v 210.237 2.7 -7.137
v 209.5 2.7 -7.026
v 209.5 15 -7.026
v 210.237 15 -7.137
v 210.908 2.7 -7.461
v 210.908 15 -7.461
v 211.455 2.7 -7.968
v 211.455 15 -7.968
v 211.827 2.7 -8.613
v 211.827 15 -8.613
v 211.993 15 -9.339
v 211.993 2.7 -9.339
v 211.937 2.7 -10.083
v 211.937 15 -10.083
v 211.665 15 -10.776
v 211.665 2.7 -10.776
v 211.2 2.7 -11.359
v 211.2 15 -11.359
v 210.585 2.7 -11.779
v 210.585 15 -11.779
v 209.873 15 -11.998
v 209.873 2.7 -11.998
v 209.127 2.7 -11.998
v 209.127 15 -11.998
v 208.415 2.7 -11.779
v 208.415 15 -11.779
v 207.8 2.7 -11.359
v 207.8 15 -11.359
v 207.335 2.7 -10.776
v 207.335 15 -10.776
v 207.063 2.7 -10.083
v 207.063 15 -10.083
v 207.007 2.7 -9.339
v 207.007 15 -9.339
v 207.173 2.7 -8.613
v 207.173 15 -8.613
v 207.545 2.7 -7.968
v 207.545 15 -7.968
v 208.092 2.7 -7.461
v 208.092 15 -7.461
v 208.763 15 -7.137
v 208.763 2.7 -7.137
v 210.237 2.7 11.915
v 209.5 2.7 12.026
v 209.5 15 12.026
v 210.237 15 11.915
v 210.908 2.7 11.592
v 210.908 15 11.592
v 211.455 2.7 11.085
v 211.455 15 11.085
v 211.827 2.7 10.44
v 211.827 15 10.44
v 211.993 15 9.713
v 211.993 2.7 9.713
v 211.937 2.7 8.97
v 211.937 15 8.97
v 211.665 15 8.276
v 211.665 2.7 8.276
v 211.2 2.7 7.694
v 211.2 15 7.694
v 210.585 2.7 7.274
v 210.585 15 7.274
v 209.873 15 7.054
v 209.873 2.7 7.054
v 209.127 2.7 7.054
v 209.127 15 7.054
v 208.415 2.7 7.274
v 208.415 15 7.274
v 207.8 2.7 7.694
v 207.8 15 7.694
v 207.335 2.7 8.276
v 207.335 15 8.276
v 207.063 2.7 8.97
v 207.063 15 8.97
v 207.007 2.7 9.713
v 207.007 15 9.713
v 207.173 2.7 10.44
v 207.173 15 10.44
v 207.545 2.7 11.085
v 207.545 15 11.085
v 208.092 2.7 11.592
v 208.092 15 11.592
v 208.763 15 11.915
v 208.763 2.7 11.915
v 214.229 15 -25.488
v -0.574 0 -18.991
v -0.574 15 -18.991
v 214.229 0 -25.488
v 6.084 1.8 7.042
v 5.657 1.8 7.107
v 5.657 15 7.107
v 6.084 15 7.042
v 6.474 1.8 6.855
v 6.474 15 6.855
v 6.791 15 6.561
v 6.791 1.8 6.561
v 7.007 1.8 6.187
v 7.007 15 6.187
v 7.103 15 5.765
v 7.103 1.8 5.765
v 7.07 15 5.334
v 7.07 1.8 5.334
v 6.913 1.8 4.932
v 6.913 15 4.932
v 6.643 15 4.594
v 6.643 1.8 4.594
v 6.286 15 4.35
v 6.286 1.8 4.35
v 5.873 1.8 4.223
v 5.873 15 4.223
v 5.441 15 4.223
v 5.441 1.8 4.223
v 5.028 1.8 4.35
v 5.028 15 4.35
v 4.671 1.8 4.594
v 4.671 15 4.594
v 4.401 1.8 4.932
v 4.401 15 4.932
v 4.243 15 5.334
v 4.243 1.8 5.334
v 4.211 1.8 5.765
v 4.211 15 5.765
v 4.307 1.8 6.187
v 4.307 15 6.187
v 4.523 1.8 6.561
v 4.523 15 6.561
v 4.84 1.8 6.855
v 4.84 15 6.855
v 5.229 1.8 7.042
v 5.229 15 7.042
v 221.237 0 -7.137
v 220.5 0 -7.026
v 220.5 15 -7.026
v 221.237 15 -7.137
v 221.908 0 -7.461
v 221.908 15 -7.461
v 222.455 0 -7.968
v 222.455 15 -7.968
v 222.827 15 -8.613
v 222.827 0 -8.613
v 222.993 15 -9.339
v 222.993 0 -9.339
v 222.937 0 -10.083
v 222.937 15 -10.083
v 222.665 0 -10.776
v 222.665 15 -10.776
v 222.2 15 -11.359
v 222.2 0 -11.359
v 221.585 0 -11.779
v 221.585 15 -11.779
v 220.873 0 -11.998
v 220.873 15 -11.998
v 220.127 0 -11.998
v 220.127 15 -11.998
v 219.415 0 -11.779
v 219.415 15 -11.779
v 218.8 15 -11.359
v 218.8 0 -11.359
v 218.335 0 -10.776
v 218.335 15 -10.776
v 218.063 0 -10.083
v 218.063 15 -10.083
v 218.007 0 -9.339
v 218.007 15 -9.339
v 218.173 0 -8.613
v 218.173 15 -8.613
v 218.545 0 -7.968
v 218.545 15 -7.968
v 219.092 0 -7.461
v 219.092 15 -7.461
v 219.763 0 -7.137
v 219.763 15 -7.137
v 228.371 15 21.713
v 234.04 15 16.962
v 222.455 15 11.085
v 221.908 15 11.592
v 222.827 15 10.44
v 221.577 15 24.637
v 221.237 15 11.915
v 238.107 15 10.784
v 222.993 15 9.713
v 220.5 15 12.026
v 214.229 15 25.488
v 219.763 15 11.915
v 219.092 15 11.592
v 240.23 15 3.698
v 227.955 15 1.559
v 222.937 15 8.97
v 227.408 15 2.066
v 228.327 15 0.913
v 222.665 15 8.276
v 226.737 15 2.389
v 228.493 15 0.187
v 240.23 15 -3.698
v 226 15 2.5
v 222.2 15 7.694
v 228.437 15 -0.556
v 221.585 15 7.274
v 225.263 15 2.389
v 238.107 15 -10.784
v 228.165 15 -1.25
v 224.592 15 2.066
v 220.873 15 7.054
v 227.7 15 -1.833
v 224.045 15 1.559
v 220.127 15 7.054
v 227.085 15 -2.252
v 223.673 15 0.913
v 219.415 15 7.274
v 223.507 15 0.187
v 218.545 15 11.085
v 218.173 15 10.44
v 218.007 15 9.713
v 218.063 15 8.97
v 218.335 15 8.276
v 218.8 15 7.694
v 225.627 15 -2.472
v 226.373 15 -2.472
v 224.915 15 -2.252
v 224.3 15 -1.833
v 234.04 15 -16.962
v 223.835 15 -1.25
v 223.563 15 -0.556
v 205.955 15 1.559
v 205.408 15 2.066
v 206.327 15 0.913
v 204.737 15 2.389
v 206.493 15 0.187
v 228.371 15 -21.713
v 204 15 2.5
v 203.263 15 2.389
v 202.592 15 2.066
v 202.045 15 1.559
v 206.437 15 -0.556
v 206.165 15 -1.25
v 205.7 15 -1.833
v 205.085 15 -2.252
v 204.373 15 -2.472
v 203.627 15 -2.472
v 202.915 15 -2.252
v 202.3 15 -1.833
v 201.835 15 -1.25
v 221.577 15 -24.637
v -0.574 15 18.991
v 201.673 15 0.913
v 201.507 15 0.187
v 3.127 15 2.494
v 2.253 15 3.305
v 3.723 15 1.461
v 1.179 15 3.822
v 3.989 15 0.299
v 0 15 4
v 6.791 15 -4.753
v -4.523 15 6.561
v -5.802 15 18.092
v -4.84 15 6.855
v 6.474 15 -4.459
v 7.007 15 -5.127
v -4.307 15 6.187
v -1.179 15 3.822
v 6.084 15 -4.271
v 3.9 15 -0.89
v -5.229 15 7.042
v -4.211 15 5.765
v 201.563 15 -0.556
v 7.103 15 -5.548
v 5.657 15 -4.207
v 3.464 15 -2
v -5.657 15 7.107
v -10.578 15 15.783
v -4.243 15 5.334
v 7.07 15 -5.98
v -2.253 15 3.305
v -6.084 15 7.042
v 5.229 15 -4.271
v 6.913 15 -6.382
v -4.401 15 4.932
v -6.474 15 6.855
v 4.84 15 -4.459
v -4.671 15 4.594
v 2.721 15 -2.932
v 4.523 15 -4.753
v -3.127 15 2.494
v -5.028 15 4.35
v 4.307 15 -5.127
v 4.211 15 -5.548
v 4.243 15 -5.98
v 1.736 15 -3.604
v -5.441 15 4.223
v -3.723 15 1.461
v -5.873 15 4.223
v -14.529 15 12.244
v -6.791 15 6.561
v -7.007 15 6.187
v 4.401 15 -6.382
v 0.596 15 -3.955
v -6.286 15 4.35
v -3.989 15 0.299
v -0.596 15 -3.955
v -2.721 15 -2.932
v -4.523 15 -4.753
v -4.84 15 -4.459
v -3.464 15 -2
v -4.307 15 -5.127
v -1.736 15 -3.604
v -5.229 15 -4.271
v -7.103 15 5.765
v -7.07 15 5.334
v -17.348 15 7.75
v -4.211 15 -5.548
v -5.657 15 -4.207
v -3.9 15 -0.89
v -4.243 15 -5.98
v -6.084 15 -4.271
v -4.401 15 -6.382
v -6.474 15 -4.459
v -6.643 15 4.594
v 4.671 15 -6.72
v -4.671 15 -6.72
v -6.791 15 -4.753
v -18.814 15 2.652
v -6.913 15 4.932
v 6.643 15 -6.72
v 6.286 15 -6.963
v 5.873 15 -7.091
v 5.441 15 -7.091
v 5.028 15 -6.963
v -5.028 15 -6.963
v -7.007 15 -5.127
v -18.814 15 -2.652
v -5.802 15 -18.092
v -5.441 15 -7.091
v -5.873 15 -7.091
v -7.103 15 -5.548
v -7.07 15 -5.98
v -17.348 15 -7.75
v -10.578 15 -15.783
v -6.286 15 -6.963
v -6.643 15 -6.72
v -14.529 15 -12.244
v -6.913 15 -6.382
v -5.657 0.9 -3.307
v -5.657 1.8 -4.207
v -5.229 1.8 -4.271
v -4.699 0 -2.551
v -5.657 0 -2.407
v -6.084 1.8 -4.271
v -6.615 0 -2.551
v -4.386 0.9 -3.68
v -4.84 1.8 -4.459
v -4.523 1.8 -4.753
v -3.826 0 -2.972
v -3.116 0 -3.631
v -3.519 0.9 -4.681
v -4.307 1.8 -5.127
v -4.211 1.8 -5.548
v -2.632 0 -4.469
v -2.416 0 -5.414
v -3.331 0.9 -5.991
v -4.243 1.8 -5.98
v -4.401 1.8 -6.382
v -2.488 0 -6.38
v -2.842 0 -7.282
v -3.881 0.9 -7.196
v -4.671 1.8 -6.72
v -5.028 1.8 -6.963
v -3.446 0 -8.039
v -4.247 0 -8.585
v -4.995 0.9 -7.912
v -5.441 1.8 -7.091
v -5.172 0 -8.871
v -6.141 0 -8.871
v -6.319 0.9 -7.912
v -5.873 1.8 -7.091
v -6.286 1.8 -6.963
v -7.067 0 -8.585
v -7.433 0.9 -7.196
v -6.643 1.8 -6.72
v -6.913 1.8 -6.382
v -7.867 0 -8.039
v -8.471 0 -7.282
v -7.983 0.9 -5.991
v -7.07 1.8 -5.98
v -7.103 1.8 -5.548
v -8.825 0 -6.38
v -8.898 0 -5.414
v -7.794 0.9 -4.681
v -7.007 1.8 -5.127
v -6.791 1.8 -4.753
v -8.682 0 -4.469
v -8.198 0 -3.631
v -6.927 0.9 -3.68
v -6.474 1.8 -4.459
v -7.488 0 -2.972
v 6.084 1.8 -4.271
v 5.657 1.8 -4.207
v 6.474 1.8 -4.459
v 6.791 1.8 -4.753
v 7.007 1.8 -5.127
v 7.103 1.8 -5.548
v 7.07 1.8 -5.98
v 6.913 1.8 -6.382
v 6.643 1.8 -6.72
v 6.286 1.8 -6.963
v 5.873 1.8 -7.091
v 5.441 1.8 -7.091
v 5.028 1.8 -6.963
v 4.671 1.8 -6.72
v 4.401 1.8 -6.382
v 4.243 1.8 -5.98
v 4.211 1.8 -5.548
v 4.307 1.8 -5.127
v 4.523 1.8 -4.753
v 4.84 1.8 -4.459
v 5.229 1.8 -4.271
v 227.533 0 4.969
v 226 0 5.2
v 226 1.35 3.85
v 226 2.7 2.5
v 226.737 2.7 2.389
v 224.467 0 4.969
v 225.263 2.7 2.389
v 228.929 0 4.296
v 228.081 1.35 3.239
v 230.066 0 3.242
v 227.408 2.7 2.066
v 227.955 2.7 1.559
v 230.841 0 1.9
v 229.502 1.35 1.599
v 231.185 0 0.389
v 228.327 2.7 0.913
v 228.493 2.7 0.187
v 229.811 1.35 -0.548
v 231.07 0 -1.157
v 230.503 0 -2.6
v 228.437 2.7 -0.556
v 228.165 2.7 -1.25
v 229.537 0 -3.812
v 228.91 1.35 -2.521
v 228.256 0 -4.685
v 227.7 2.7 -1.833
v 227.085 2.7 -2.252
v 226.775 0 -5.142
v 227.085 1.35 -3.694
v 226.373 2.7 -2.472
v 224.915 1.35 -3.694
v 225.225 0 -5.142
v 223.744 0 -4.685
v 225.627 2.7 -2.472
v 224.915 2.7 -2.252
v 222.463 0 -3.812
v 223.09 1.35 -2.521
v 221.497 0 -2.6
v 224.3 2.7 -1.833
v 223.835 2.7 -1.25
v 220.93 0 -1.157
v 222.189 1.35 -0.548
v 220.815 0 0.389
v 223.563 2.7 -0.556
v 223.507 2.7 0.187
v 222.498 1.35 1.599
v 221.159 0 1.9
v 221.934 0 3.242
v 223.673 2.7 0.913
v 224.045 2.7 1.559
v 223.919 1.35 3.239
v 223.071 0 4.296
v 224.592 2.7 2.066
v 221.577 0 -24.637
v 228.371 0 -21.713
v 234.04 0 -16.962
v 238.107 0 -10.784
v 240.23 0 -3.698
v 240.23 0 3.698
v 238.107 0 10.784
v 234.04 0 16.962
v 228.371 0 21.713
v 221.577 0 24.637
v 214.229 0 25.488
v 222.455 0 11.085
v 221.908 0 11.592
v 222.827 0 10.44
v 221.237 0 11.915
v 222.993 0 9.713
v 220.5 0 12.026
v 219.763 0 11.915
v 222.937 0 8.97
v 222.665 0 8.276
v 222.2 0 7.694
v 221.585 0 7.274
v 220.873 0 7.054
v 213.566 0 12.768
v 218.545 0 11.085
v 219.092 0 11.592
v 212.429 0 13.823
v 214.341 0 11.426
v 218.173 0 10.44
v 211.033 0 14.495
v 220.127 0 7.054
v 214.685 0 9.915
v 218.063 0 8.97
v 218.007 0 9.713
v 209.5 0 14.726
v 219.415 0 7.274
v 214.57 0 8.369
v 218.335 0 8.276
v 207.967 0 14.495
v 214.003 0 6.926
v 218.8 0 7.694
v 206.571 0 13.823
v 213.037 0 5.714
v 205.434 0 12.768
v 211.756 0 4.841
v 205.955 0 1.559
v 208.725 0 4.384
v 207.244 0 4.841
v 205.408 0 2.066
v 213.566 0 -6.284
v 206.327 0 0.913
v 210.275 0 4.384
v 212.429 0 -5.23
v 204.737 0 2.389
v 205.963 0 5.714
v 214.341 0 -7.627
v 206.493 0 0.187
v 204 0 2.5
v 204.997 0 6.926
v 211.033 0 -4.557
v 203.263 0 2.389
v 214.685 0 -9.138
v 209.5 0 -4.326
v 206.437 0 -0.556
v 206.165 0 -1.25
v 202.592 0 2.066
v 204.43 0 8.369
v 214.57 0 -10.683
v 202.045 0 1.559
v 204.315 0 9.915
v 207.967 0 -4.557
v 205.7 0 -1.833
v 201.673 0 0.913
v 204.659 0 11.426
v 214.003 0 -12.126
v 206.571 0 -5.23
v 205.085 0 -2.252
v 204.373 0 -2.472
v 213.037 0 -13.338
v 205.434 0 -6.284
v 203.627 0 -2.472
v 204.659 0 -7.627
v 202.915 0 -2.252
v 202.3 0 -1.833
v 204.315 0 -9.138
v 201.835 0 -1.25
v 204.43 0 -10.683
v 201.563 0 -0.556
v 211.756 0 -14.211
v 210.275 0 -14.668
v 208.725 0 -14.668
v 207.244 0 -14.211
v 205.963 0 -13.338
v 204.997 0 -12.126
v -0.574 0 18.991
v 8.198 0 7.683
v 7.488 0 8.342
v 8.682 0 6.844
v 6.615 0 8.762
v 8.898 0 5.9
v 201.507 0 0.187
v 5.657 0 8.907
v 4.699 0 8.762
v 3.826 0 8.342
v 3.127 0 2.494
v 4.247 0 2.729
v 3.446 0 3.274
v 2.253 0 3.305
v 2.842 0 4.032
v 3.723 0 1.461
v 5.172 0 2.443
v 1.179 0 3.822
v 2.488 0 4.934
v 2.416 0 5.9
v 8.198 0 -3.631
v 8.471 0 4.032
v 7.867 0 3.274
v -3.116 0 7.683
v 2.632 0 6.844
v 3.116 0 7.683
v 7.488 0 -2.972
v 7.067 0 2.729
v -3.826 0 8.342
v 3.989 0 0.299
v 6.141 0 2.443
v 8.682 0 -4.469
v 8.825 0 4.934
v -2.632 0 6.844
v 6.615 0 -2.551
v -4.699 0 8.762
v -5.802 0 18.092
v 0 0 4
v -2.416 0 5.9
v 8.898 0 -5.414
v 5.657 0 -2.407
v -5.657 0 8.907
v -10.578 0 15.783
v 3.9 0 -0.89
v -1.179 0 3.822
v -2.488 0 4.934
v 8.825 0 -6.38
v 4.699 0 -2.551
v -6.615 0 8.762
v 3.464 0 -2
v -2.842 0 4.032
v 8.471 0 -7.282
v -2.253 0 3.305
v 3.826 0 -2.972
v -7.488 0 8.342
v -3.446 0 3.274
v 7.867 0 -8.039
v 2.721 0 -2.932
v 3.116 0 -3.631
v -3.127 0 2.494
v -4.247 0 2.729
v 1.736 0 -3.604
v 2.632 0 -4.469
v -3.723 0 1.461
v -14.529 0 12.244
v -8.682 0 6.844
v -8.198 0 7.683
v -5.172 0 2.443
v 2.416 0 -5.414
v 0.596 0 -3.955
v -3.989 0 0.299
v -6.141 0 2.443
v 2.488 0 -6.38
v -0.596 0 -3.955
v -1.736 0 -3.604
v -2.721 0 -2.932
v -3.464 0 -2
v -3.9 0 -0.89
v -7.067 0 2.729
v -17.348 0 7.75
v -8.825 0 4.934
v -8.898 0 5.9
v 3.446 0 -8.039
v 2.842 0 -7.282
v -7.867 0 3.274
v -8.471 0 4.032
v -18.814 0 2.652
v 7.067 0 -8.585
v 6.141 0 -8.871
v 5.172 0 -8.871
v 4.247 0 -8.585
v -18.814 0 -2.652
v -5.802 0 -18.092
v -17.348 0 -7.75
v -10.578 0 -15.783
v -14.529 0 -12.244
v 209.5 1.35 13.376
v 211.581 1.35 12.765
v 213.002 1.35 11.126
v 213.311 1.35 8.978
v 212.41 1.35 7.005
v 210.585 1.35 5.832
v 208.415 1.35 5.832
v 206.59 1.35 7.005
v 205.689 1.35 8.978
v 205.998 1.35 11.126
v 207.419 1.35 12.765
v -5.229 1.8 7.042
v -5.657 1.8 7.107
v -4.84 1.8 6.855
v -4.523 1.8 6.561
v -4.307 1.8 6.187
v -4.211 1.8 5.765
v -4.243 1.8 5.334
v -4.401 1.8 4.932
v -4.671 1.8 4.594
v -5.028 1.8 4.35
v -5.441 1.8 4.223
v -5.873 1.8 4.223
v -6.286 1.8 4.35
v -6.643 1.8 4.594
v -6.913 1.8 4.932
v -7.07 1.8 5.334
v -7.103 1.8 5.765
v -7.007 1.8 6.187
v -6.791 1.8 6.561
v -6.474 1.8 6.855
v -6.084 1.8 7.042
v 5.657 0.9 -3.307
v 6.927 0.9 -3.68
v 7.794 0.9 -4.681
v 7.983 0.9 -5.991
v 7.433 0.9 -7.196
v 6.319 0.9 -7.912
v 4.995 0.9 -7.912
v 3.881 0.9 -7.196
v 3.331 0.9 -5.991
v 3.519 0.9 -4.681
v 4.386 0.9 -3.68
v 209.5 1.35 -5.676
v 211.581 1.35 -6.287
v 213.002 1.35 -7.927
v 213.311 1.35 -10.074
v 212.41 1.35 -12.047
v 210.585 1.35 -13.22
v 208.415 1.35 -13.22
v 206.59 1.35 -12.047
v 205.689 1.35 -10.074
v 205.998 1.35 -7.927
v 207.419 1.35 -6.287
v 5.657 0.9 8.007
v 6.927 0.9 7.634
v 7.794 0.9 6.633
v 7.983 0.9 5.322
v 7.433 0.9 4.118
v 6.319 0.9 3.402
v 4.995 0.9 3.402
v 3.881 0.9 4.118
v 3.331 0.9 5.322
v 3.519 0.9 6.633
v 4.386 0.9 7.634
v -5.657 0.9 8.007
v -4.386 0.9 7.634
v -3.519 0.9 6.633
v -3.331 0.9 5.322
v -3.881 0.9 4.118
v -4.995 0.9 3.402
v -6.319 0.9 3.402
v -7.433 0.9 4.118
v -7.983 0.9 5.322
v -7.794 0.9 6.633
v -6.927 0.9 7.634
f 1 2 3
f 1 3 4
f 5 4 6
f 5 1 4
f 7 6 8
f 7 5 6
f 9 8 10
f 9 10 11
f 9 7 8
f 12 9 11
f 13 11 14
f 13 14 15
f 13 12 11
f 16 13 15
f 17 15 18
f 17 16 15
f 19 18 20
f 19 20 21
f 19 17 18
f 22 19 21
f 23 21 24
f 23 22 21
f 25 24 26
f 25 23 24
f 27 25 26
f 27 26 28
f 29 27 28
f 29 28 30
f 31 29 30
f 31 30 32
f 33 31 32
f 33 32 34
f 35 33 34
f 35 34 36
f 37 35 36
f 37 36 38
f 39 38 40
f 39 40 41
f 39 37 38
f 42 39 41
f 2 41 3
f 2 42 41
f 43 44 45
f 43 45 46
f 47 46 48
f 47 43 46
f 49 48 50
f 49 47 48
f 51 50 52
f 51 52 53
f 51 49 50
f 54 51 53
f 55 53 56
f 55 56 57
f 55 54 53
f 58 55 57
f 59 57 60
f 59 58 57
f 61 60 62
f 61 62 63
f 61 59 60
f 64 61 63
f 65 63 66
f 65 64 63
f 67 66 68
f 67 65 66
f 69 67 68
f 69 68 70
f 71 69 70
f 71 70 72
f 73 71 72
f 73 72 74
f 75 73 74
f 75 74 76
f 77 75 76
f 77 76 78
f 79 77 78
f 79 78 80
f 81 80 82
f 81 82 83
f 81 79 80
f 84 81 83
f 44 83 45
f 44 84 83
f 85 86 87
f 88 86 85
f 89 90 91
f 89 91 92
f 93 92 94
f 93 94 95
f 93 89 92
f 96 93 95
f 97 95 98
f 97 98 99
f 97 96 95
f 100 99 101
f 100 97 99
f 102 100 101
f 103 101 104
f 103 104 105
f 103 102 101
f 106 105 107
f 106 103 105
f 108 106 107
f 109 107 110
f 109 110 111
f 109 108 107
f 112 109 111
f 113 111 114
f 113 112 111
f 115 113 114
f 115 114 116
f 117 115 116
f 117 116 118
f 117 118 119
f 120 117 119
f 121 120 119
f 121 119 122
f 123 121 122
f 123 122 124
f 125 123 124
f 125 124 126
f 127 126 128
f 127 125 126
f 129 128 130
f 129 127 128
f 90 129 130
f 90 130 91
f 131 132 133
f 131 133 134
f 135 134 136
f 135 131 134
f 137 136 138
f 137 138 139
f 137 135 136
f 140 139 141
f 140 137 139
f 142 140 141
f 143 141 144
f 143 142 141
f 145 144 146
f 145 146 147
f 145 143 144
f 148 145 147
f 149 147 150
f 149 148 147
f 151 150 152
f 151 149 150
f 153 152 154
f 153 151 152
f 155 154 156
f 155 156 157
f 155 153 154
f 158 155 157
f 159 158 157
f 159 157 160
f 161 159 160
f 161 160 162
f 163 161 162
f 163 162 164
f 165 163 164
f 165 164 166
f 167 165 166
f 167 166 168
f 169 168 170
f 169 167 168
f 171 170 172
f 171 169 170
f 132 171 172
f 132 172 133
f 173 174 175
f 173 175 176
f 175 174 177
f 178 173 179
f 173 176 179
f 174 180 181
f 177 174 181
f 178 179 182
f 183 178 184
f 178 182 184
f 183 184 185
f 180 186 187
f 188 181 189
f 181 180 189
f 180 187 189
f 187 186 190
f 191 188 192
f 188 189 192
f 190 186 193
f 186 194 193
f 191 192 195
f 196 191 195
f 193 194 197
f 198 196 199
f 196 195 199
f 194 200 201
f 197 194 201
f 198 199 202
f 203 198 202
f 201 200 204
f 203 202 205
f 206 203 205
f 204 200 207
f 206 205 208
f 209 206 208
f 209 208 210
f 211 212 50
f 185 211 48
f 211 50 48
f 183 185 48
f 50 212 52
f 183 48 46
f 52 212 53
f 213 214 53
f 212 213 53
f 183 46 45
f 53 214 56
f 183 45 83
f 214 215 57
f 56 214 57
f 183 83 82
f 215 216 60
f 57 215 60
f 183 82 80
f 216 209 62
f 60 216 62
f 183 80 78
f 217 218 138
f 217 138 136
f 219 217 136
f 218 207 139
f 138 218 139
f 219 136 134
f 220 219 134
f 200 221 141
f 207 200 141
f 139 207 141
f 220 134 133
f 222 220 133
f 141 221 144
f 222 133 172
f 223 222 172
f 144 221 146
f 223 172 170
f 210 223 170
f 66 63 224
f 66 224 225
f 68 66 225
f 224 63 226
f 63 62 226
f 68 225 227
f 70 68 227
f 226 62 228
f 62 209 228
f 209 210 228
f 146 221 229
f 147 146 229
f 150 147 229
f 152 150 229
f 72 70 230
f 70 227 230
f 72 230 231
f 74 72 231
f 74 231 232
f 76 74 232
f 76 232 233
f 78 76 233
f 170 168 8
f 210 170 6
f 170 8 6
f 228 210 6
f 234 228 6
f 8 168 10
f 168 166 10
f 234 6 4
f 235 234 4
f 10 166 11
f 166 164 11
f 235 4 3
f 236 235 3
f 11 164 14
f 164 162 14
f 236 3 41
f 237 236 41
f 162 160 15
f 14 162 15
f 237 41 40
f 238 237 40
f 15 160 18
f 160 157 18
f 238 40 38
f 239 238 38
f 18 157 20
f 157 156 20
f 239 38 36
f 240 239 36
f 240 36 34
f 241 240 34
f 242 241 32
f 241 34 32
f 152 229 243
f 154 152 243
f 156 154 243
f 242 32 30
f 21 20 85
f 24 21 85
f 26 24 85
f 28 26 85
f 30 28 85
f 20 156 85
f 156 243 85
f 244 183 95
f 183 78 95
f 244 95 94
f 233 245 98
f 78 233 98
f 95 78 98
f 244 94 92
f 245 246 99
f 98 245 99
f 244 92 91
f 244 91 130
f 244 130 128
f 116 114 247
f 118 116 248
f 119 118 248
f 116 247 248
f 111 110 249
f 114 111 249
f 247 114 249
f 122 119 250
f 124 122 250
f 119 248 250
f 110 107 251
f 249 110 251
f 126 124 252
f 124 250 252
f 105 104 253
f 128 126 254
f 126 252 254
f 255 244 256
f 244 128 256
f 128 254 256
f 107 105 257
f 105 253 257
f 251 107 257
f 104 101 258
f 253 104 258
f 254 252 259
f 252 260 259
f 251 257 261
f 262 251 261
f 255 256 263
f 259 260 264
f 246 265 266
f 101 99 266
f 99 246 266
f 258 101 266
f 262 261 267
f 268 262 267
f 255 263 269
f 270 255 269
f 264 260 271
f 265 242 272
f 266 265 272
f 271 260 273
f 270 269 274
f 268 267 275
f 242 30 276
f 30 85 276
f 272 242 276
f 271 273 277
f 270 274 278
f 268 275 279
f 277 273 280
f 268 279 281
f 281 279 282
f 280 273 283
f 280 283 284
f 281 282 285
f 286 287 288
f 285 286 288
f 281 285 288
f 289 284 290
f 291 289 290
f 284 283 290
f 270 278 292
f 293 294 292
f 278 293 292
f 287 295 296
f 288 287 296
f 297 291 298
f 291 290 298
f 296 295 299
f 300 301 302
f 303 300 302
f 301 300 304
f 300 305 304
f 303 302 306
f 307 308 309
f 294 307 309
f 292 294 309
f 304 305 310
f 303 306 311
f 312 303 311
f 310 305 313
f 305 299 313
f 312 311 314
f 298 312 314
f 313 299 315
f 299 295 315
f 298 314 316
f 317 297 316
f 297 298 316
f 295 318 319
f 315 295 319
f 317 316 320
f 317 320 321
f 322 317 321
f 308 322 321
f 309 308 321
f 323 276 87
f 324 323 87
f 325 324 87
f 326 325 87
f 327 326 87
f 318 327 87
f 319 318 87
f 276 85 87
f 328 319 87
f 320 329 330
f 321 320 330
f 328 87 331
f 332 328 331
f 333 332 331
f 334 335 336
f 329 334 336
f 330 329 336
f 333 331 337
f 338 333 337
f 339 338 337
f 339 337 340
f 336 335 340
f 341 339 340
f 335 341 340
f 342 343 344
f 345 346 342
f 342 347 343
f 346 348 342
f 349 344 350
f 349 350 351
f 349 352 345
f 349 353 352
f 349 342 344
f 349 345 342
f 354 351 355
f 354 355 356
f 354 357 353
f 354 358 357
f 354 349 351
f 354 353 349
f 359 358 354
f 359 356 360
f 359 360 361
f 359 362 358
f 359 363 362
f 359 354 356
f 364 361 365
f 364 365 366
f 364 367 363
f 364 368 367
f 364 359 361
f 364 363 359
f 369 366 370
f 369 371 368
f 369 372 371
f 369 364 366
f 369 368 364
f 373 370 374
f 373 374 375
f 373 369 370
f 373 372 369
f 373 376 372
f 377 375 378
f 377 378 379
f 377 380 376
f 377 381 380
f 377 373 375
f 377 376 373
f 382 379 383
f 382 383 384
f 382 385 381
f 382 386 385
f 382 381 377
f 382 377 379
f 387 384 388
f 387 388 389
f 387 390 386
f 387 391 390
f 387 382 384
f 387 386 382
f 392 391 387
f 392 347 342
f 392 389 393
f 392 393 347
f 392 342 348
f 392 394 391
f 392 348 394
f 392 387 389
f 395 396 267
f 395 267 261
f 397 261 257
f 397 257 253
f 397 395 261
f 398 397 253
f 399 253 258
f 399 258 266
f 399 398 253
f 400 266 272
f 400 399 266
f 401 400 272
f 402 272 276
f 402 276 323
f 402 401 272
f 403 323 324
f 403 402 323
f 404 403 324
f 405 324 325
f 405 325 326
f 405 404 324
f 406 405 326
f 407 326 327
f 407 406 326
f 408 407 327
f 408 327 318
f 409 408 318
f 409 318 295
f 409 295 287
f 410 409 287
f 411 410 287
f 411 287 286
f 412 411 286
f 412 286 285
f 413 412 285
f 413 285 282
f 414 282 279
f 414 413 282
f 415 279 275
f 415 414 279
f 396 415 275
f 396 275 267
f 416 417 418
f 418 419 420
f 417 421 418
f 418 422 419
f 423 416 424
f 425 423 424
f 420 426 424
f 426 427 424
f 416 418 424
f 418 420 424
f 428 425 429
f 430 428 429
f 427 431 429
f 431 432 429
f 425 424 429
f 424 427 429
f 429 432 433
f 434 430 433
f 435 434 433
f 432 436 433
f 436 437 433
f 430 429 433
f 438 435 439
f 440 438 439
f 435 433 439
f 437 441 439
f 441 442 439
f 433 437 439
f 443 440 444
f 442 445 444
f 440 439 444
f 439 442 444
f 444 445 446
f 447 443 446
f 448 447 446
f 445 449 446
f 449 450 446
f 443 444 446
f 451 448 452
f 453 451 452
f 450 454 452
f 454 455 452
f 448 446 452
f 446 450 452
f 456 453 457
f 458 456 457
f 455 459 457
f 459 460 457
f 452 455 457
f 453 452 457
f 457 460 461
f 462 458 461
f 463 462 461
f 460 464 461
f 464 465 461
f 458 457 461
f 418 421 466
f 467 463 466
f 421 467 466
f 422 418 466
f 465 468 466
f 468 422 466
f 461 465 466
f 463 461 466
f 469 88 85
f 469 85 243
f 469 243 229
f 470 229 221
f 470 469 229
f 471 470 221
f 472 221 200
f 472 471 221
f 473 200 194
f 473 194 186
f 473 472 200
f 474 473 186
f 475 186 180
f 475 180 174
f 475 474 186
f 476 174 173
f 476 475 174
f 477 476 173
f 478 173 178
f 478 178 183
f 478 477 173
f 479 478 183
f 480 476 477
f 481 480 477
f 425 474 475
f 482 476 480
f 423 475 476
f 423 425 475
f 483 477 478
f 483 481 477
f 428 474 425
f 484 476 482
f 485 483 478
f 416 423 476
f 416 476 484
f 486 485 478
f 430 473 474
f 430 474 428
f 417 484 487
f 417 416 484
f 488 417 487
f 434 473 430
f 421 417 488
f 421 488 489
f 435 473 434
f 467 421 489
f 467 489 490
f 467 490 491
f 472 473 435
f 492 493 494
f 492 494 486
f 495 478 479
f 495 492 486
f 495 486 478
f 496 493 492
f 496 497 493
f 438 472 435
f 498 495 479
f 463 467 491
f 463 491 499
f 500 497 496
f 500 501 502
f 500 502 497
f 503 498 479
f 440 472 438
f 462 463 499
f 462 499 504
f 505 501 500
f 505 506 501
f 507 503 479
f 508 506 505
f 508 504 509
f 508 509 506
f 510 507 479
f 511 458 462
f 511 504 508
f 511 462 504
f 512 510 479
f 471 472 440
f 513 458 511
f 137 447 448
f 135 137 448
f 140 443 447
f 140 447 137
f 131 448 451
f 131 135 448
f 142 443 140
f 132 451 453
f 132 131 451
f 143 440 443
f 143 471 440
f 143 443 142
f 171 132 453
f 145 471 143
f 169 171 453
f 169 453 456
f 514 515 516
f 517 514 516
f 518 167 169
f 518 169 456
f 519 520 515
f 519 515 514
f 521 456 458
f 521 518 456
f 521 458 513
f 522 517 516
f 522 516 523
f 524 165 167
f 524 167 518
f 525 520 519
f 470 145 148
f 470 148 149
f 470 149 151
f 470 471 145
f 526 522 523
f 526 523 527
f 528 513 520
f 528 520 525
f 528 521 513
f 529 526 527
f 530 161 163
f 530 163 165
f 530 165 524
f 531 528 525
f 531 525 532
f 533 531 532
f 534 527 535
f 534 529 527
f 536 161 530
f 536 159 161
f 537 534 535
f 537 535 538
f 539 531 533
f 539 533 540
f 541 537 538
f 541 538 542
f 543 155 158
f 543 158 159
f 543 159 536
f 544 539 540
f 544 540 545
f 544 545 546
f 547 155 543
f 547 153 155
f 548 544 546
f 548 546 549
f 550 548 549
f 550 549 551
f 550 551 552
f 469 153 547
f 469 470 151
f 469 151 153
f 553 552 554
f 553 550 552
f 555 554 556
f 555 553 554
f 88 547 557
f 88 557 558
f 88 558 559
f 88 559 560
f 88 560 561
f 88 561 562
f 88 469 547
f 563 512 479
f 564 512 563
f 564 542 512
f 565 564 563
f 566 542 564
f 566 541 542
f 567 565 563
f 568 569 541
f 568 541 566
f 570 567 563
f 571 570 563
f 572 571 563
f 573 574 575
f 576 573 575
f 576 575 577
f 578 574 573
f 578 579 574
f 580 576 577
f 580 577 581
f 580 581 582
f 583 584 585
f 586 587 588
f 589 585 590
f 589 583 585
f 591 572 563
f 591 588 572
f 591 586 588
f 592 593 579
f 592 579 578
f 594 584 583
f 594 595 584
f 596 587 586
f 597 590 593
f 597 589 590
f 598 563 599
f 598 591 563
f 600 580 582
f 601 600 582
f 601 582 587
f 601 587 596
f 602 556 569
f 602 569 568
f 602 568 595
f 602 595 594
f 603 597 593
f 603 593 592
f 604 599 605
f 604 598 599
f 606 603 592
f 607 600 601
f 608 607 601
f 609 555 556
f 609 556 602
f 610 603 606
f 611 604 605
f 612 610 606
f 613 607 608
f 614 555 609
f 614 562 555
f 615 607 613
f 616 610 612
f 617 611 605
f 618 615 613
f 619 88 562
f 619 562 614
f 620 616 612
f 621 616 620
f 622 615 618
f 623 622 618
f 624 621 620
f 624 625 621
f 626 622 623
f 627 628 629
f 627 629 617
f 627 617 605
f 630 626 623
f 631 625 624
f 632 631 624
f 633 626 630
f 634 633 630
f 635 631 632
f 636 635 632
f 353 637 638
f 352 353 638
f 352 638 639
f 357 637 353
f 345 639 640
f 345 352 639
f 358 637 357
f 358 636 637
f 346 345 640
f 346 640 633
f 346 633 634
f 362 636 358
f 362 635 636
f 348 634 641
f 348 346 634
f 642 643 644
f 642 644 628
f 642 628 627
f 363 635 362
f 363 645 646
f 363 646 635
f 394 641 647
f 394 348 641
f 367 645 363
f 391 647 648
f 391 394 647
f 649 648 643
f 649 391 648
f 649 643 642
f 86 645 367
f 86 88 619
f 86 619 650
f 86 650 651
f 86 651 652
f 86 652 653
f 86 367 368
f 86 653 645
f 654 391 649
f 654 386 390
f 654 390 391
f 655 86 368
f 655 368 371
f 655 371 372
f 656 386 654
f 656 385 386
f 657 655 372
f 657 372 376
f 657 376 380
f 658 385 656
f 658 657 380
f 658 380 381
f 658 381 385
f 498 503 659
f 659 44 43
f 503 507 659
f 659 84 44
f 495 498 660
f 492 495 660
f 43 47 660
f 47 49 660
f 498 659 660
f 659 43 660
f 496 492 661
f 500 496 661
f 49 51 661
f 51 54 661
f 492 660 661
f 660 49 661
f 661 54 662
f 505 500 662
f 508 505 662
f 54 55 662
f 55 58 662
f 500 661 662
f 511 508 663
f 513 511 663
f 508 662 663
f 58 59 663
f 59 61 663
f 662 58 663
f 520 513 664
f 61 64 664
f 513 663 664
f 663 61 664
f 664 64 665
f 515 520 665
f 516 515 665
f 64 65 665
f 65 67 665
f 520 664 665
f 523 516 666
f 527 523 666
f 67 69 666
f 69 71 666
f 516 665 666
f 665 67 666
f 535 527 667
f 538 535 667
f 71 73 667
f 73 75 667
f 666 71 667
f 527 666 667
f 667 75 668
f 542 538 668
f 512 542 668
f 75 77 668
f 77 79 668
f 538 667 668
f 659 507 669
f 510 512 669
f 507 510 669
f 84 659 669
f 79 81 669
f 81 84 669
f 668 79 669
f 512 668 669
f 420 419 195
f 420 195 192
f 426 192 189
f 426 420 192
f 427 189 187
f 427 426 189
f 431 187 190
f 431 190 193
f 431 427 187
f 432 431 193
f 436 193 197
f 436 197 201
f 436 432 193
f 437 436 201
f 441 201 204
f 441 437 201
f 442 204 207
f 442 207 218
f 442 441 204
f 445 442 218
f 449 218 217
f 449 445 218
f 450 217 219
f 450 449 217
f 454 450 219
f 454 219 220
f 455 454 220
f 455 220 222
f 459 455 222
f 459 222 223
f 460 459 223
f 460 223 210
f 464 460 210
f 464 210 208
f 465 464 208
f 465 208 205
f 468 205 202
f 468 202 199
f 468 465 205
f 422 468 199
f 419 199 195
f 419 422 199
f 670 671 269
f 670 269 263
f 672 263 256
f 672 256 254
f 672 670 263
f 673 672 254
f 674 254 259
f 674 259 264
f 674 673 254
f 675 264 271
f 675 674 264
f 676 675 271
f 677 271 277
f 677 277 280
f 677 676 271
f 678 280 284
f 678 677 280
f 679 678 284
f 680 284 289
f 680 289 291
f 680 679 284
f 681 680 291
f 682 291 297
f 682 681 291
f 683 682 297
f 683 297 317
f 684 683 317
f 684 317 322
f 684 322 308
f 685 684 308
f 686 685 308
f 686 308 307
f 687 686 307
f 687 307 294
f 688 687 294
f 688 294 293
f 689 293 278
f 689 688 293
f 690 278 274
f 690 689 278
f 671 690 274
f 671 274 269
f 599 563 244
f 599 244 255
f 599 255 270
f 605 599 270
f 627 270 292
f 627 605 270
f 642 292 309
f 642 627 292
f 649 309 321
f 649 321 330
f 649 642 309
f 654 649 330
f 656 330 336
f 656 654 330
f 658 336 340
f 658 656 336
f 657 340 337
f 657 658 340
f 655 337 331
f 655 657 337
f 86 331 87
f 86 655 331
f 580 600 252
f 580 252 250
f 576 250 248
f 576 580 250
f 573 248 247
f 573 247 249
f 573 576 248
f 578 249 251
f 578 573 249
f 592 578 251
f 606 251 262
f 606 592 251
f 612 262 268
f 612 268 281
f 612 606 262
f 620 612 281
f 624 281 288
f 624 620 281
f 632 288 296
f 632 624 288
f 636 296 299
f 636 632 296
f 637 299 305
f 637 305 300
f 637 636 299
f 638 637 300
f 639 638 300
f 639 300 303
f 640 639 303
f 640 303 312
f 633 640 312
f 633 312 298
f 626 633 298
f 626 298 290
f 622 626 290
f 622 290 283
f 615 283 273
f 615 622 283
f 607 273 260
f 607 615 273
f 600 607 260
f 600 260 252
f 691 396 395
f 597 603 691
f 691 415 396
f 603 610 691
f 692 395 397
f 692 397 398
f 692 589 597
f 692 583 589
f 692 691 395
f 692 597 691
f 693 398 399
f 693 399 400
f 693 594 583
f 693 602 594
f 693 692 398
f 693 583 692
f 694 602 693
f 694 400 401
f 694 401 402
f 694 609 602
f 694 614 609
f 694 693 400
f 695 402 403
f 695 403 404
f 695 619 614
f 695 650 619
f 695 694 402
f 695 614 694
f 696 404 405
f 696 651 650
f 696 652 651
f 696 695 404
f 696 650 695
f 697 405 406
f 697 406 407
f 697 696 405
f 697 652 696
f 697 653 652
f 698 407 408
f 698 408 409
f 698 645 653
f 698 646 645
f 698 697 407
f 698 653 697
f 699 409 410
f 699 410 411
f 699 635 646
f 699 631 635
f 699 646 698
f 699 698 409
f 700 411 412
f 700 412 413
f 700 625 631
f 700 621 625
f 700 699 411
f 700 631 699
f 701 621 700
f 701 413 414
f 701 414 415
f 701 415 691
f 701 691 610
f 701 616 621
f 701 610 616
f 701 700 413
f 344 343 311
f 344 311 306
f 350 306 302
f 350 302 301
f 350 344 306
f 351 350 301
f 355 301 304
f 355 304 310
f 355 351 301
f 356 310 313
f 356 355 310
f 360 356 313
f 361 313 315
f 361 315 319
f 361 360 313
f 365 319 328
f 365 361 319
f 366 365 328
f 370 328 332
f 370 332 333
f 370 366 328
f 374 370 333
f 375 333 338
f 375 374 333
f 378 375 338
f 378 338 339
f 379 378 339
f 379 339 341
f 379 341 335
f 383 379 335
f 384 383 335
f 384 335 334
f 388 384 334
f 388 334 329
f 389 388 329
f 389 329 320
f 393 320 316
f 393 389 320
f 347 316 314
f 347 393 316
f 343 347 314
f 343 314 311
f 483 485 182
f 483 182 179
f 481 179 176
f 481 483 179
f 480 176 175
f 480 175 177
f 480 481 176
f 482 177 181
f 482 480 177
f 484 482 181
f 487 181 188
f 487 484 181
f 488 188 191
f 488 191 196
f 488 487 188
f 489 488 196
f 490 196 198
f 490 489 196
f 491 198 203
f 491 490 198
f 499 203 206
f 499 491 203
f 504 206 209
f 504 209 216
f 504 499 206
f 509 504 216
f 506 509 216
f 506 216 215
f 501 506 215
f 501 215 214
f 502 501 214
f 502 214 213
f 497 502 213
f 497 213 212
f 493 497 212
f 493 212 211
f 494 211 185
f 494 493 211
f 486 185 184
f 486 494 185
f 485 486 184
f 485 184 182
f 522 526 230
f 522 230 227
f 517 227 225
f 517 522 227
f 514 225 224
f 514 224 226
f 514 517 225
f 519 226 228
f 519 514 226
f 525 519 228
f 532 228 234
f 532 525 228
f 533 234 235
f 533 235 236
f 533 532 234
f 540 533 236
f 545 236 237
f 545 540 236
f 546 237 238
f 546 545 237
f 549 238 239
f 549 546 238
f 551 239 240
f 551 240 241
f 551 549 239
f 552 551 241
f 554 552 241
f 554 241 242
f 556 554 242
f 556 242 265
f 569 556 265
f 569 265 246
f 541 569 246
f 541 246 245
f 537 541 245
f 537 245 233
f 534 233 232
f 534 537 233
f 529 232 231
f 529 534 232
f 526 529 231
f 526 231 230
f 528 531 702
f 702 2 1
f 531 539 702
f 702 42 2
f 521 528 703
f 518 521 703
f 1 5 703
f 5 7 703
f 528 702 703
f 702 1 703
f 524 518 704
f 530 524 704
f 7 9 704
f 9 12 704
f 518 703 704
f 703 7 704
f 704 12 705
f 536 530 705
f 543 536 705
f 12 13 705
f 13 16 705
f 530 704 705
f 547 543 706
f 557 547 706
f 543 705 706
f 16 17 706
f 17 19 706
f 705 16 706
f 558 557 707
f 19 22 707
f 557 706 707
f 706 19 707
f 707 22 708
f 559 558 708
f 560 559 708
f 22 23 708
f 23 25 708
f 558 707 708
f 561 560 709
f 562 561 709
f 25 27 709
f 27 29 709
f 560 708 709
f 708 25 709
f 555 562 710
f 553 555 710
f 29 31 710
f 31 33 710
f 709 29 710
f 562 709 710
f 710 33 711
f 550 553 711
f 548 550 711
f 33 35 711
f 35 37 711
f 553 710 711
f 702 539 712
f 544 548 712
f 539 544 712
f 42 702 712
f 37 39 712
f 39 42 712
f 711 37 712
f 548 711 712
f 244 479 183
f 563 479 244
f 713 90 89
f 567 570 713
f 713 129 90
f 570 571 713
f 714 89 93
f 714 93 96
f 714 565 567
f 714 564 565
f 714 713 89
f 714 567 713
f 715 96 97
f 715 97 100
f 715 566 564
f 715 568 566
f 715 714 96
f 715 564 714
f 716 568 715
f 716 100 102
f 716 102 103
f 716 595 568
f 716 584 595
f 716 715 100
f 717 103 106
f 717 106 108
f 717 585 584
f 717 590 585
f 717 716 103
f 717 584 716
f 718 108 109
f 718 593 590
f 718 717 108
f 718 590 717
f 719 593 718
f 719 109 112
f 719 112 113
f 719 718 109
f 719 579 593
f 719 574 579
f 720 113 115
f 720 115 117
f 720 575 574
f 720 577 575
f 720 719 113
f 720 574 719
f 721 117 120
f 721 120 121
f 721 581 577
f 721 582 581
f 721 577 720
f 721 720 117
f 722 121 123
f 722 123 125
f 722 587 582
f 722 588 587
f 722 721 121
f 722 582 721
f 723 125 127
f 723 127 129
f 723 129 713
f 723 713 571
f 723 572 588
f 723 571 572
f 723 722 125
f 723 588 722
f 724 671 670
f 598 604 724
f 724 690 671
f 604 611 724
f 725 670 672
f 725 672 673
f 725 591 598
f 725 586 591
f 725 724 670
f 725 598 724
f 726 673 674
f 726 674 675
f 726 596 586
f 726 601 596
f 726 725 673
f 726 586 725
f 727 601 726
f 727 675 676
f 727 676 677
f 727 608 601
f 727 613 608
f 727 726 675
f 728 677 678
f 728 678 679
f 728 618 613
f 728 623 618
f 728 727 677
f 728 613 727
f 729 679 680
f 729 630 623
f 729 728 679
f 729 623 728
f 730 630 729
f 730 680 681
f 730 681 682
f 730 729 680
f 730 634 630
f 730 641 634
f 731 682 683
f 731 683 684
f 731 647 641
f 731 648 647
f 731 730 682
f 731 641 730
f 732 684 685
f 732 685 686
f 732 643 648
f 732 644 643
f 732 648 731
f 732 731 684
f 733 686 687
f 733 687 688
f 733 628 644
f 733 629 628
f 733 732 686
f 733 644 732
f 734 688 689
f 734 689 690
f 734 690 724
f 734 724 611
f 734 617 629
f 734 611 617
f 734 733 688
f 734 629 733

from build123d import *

# Parameters (mm, degrees)
SKETCH_1_R      = 4
SKETCH_1_R_2    = 2.5
SKETCH_1_R_3    = 1.45
EXTRUDE_1_DEPTH = 15
CHAMFER_1_SIZE  = 1.8
CHAMFER_2_SIZE  = 2.7


with BuildPart() as part:
    # 草图1 → 凸台-拉伸1 (new body)
    with BuildSketch(Plane(origin=(0, 0, 0), x_dir=(1, 0, 0), z_dir=(0, 1, 0))):
        with BuildLine():
            Line((-0.574418605, 18.991314943), (214.229069767, 25.488343739))
            ThreePointArc((214.229069767, 25.488343739), (240.5, 0), (214.229069767, -25.488343739))
            Line((214.229069767, -25.488343739), (-0.574418605, -18.991314943))
            ThreePointArc((-0.574418605, -18.991314943), (-19, 0), (-0.574418605, 18.991314943))
        make_face()
        with Locations(Location((0, 0, 0), (0, 0, 270))):
            Circle(SKETCH_1_R, mode=Mode.SUBTRACT)
        with Locations(Location((209.5, 9.526279442, 0), (0, 0, 270))):
            Circle(SKETCH_1_R_2, mode=Mode.SUBTRACT)
        with Locations(Location((220.5, 9.526279442, 0), (0, 0, 270))):
            Circle(SKETCH_1_R_2, mode=Mode.SUBTRACT)
        with Locations(Location((226, 0, 0), (0, 0, 270))):
            Circle(SKETCH_1_R_2, mode=Mode.SUBTRACT)
        with Locations(Location((220.5, -9.526279442, 0), (0, 0, 270))):
            Circle(SKETCH_1_R_2, mode=Mode.SUBTRACT)
        with Locations(Location((209.5, -9.526279442, 0), (0, 0, 270))):
            Circle(SKETCH_1_R_2, mode=Mode.SUBTRACT)
        with Locations(Location((204, 0, 0), (0, 0, 270))):
            Circle(SKETCH_1_R_2, mode=Mode.SUBTRACT)
        with Locations(Location((-5.656854249, 5.656854249, 0), (0, 0, 270))):
            Circle(SKETCH_1_R_3, mode=Mode.SUBTRACT)
        with Locations(Location((5.656854249, 5.656854249, 0), (0, 0, 270))):
            Circle(SKETCH_1_R_3, mode=Mode.SUBTRACT)
        with Locations(Location((5.656854249, -5.656854249, 0), (0, 0, 270))):
            Circle(SKETCH_1_R_3, mode=Mode.SUBTRACT)
        with Locations(Location((-5.656854249, -5.656854249, 0), (0, 0, 270))):
            Circle(SKETCH_1_R_3, mode=Mode.SUBTRACT)
    extrude(amount=EXTRUDE_1_DEPTH)

    # 倒角1
    chamfer_1_edges = [part.edges().sort_by_distance(p)[0] for p in [
        (5.656854249, 0, -7.106854249),
        (-5.656854249, 0, -7.106854249),
        (5.656854249, 0, 4.206854249),
        (-5.656854249, 0, 4.206854249),
    ]]
    chamfer(chamfer_1_edges, length=CHAMFER_1_SIZE)

    # 倒角2
    chamfer_2_edges = [part.edges().sort_by_distance(p)[0] for p in [
        (209.5, 0, -12.026279442),
        (226, 0, -2.5),
        (209.5, 0, 7.026279442),
    ]]
    chamfer(chamfer_2_edges, length=CHAMFER_2_SIZE)


solid = part.part
